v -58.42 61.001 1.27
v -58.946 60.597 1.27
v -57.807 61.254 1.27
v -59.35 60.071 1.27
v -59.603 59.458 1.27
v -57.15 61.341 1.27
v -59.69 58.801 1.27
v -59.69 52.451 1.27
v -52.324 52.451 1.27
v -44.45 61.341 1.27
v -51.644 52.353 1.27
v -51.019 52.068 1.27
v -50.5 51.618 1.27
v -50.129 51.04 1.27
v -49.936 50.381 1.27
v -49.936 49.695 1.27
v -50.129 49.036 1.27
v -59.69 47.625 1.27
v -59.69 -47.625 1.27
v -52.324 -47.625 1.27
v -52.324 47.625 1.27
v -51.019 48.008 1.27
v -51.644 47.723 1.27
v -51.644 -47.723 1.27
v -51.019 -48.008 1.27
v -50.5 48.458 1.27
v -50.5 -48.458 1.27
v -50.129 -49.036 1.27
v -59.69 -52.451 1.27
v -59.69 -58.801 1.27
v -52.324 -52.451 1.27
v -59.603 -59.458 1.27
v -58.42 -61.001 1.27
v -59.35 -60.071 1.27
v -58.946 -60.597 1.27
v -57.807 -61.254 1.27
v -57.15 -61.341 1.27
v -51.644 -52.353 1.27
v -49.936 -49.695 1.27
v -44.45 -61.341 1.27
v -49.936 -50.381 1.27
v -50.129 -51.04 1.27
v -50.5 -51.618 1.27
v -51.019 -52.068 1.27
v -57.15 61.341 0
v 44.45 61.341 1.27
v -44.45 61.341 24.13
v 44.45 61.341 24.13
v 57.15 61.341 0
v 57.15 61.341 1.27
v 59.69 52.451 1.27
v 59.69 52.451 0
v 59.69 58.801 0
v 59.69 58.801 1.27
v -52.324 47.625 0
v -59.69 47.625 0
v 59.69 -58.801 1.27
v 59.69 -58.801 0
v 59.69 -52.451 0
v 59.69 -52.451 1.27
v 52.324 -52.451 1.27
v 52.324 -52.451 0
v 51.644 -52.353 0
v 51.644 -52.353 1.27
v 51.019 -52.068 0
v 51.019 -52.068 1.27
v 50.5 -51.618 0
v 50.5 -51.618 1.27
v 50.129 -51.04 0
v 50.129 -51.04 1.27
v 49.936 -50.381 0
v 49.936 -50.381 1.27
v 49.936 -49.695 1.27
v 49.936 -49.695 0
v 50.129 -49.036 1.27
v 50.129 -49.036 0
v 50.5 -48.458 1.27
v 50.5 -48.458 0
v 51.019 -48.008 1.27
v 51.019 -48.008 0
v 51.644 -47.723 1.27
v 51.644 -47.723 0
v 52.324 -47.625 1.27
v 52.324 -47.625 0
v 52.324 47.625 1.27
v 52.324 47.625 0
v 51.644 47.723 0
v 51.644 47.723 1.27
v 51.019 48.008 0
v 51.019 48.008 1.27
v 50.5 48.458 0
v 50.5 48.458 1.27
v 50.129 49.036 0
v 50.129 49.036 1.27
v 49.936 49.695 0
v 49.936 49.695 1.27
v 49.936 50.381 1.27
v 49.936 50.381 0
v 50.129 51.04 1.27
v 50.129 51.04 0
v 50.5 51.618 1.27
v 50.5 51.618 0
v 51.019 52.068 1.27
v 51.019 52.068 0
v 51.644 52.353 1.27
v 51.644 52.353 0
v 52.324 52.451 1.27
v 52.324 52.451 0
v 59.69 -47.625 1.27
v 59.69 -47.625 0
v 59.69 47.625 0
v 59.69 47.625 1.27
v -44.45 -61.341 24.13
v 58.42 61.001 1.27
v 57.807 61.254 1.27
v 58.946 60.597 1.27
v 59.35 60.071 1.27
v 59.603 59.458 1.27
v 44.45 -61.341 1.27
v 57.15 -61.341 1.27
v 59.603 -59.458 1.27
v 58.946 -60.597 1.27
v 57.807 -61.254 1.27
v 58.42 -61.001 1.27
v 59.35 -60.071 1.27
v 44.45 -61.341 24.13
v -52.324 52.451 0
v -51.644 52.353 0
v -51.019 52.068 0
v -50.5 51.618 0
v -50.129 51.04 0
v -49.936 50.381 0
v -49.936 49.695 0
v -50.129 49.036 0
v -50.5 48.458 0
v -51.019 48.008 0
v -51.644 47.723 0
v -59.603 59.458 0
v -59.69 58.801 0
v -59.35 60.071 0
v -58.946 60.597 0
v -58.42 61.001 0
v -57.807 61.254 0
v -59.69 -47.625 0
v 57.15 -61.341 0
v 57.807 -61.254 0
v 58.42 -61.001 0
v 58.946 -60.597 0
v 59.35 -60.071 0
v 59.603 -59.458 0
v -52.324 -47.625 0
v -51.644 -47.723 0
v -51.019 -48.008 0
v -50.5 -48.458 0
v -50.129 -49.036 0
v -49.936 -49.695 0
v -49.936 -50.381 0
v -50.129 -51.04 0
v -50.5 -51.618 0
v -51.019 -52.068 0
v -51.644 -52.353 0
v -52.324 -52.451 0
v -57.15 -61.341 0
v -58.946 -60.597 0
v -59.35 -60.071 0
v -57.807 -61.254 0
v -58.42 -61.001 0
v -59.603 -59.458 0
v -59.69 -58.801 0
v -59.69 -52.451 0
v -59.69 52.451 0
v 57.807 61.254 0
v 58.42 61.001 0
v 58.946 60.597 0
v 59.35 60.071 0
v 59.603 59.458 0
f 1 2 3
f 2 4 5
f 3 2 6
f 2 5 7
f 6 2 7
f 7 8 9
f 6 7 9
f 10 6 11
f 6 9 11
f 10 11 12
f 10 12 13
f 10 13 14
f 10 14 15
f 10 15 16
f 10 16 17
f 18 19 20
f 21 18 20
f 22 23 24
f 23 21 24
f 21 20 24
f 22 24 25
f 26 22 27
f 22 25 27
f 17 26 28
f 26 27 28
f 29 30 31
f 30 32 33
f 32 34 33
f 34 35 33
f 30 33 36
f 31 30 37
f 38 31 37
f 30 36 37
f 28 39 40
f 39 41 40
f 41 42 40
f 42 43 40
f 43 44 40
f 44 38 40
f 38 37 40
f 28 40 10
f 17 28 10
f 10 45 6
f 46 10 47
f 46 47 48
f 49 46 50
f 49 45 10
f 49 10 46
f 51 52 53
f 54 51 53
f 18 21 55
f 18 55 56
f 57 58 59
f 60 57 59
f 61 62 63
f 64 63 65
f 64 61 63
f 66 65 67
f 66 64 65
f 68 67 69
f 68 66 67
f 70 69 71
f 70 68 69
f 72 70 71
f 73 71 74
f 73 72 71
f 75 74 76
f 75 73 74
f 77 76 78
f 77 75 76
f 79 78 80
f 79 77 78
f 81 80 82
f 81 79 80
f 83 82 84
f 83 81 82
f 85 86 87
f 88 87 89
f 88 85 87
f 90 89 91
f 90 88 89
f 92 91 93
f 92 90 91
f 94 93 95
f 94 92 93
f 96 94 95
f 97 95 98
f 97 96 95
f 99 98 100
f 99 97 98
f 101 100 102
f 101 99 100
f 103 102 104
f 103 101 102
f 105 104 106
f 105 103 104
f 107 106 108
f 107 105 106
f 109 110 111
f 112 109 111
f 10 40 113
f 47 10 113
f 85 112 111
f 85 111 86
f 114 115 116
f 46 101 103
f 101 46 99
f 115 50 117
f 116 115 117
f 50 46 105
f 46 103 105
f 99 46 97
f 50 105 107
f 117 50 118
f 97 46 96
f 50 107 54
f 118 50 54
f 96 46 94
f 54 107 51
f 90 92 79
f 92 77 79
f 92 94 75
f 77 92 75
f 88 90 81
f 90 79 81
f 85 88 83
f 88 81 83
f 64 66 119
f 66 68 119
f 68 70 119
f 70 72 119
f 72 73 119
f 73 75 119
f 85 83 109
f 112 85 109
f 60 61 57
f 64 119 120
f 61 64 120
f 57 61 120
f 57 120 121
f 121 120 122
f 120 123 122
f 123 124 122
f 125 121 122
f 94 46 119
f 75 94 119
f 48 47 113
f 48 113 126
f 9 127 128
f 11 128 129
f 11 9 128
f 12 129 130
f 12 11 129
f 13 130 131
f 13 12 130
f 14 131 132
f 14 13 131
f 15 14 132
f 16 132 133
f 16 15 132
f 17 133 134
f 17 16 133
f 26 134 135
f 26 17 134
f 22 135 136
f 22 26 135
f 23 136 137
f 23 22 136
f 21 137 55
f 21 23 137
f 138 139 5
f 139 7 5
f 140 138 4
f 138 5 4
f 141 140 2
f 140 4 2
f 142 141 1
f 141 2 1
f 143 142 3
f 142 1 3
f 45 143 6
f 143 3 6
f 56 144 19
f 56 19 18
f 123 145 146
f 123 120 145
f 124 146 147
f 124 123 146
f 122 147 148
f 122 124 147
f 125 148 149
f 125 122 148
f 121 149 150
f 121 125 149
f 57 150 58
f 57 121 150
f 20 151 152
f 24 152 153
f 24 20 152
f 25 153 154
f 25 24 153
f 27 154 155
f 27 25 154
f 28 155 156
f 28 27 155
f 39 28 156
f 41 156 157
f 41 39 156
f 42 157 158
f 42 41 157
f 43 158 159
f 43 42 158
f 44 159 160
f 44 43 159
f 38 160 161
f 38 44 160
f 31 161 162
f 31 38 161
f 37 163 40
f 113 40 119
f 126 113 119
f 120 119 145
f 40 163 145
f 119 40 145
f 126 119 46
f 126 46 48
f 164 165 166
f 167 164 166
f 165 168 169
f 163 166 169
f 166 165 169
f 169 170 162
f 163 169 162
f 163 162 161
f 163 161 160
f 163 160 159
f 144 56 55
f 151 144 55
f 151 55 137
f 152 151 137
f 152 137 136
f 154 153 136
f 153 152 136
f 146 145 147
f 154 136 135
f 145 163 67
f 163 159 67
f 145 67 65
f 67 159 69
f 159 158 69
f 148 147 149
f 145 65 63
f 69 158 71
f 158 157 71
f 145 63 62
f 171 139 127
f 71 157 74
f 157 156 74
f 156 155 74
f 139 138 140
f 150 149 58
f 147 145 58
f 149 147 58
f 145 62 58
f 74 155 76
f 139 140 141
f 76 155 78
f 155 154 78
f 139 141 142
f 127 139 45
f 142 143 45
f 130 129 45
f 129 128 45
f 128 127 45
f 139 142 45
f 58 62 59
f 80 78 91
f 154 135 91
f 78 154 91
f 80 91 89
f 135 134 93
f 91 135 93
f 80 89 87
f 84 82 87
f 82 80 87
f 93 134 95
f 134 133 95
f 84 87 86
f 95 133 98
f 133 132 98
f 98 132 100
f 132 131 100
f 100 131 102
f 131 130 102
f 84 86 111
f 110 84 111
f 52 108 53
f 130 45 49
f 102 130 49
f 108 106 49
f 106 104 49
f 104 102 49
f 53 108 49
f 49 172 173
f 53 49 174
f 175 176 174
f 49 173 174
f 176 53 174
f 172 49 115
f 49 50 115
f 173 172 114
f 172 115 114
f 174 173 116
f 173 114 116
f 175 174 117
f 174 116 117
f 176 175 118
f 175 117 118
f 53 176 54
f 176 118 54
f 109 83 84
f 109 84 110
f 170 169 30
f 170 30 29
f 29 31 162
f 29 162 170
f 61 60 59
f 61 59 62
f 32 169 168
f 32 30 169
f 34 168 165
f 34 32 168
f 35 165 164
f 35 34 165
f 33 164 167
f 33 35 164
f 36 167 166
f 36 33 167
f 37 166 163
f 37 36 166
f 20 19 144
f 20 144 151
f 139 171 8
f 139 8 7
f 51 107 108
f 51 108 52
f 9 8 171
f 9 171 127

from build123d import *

# Parameters (mm, degrees)
SKETCH1_W           = 119.38
SKETCH1_H           = 122.682
BOSS_EXTRUDE1_DEPTH = 24.13
SKETCH2_W           = 15.24
SKETCH2_H           = 22.86
CUT_EXTRUDE1_DEPTH  = 139.549724374
CUT_EXTRUDE2_DEPTH  = 89.590033192
FILLET1_R           = 2.54


with BuildPart() as part:
    # Sketch1 → Boss-Extrude1 (new body)
    with BuildSketch(Plane.XY):
        Rectangle(SKETCH1_W, SKETCH1_H)
    extrude(amount=BOSS_EXTRUDE1_DEPTH)

    # Sketch2 → Cut-Extrude1 (cut, through all)
    with BuildSketch(Plane.XZ.offset(61.341)):
        with Locations((52.07, 12.7)):
            Rectangle(SKETCH2_W, SKETCH2_H)
        with Locations((-52.07, 12.7)):
            Rectangle(SKETCH2_W, SKETCH2_H)
    extrude(amount=-CUT_EXTRUDE1_DEPTH, mode=Mode.SUBTRACT)

    # Sketch3 → Cut-Extrude2 (cut, through all)
    with BuildSketch(Plane.XY.offset(1.27)):
        with BuildLine():
            Line((-59.69, 52.451), (-52.324, 52.451))
            ThreePointArc((-52.324, 52.451), (-49.911, 50.038), (-52.324, 47.625))
            Line((-52.324, 47.625), (-59.69, 47.625))
            ThreePointArc((-59.69, 47.625), (-62.103, 50.038), (-59.69, 52.451))
        make_face()
        with BuildLine():
            Line((-59.69, -47.625), (-52.324, -47.625))
            ThreePointArc((-52.324, -47.625), (-49.911, -50.038), (-52.324, -52.451))
            Line((-52.324, -52.451), (-59.69, -52.451))
            ThreePointArc((-59.69, -52.451), (-62.103, -50.038), (-59.69, -47.625))
        make_face()
        with BuildLine():
            Line((59.69, -52.451), (52.324, -52.451))
            ThreePointArc((52.324, -52.451), (49.911, -50.038), (52.324, -47.625))
            Line((52.324, -47.625), (59.69, -47.625))
            ThreePointArc((59.69, -47.625), (62.103, -50.038), (59.69, -52.451))
        make_face()
        with BuildLine():
            Line((59.69, 47.625), (52.324, 47.625))
            ThreePointArc((52.324, 47.625), (49.911, 50.038), (52.324, 52.451))
            Line((52.324, 52.451), (59.69, 52.451))
            ThreePointArc((59.69, 52.451), (62.103, 50.038), (59.69, 47.625))
        make_face()
    extrude(amount=-CUT_EXTRUDE2_DEPTH, mode=Mode.SUBTRACT)

    # Fillet1
    fillet1_edges = [part.edges().sort_by_distance(p)[0] for p in [
        (59.69, -61.341, 0.635),
        (-59.69, -61.341, 0.635),
        (-59.69, 61.341, 0.635),
        (59.69, 61.341, 0.635),
    ]]
    fillet(fillet1_edges, radius=FILLET1_R)


solid = part.part
